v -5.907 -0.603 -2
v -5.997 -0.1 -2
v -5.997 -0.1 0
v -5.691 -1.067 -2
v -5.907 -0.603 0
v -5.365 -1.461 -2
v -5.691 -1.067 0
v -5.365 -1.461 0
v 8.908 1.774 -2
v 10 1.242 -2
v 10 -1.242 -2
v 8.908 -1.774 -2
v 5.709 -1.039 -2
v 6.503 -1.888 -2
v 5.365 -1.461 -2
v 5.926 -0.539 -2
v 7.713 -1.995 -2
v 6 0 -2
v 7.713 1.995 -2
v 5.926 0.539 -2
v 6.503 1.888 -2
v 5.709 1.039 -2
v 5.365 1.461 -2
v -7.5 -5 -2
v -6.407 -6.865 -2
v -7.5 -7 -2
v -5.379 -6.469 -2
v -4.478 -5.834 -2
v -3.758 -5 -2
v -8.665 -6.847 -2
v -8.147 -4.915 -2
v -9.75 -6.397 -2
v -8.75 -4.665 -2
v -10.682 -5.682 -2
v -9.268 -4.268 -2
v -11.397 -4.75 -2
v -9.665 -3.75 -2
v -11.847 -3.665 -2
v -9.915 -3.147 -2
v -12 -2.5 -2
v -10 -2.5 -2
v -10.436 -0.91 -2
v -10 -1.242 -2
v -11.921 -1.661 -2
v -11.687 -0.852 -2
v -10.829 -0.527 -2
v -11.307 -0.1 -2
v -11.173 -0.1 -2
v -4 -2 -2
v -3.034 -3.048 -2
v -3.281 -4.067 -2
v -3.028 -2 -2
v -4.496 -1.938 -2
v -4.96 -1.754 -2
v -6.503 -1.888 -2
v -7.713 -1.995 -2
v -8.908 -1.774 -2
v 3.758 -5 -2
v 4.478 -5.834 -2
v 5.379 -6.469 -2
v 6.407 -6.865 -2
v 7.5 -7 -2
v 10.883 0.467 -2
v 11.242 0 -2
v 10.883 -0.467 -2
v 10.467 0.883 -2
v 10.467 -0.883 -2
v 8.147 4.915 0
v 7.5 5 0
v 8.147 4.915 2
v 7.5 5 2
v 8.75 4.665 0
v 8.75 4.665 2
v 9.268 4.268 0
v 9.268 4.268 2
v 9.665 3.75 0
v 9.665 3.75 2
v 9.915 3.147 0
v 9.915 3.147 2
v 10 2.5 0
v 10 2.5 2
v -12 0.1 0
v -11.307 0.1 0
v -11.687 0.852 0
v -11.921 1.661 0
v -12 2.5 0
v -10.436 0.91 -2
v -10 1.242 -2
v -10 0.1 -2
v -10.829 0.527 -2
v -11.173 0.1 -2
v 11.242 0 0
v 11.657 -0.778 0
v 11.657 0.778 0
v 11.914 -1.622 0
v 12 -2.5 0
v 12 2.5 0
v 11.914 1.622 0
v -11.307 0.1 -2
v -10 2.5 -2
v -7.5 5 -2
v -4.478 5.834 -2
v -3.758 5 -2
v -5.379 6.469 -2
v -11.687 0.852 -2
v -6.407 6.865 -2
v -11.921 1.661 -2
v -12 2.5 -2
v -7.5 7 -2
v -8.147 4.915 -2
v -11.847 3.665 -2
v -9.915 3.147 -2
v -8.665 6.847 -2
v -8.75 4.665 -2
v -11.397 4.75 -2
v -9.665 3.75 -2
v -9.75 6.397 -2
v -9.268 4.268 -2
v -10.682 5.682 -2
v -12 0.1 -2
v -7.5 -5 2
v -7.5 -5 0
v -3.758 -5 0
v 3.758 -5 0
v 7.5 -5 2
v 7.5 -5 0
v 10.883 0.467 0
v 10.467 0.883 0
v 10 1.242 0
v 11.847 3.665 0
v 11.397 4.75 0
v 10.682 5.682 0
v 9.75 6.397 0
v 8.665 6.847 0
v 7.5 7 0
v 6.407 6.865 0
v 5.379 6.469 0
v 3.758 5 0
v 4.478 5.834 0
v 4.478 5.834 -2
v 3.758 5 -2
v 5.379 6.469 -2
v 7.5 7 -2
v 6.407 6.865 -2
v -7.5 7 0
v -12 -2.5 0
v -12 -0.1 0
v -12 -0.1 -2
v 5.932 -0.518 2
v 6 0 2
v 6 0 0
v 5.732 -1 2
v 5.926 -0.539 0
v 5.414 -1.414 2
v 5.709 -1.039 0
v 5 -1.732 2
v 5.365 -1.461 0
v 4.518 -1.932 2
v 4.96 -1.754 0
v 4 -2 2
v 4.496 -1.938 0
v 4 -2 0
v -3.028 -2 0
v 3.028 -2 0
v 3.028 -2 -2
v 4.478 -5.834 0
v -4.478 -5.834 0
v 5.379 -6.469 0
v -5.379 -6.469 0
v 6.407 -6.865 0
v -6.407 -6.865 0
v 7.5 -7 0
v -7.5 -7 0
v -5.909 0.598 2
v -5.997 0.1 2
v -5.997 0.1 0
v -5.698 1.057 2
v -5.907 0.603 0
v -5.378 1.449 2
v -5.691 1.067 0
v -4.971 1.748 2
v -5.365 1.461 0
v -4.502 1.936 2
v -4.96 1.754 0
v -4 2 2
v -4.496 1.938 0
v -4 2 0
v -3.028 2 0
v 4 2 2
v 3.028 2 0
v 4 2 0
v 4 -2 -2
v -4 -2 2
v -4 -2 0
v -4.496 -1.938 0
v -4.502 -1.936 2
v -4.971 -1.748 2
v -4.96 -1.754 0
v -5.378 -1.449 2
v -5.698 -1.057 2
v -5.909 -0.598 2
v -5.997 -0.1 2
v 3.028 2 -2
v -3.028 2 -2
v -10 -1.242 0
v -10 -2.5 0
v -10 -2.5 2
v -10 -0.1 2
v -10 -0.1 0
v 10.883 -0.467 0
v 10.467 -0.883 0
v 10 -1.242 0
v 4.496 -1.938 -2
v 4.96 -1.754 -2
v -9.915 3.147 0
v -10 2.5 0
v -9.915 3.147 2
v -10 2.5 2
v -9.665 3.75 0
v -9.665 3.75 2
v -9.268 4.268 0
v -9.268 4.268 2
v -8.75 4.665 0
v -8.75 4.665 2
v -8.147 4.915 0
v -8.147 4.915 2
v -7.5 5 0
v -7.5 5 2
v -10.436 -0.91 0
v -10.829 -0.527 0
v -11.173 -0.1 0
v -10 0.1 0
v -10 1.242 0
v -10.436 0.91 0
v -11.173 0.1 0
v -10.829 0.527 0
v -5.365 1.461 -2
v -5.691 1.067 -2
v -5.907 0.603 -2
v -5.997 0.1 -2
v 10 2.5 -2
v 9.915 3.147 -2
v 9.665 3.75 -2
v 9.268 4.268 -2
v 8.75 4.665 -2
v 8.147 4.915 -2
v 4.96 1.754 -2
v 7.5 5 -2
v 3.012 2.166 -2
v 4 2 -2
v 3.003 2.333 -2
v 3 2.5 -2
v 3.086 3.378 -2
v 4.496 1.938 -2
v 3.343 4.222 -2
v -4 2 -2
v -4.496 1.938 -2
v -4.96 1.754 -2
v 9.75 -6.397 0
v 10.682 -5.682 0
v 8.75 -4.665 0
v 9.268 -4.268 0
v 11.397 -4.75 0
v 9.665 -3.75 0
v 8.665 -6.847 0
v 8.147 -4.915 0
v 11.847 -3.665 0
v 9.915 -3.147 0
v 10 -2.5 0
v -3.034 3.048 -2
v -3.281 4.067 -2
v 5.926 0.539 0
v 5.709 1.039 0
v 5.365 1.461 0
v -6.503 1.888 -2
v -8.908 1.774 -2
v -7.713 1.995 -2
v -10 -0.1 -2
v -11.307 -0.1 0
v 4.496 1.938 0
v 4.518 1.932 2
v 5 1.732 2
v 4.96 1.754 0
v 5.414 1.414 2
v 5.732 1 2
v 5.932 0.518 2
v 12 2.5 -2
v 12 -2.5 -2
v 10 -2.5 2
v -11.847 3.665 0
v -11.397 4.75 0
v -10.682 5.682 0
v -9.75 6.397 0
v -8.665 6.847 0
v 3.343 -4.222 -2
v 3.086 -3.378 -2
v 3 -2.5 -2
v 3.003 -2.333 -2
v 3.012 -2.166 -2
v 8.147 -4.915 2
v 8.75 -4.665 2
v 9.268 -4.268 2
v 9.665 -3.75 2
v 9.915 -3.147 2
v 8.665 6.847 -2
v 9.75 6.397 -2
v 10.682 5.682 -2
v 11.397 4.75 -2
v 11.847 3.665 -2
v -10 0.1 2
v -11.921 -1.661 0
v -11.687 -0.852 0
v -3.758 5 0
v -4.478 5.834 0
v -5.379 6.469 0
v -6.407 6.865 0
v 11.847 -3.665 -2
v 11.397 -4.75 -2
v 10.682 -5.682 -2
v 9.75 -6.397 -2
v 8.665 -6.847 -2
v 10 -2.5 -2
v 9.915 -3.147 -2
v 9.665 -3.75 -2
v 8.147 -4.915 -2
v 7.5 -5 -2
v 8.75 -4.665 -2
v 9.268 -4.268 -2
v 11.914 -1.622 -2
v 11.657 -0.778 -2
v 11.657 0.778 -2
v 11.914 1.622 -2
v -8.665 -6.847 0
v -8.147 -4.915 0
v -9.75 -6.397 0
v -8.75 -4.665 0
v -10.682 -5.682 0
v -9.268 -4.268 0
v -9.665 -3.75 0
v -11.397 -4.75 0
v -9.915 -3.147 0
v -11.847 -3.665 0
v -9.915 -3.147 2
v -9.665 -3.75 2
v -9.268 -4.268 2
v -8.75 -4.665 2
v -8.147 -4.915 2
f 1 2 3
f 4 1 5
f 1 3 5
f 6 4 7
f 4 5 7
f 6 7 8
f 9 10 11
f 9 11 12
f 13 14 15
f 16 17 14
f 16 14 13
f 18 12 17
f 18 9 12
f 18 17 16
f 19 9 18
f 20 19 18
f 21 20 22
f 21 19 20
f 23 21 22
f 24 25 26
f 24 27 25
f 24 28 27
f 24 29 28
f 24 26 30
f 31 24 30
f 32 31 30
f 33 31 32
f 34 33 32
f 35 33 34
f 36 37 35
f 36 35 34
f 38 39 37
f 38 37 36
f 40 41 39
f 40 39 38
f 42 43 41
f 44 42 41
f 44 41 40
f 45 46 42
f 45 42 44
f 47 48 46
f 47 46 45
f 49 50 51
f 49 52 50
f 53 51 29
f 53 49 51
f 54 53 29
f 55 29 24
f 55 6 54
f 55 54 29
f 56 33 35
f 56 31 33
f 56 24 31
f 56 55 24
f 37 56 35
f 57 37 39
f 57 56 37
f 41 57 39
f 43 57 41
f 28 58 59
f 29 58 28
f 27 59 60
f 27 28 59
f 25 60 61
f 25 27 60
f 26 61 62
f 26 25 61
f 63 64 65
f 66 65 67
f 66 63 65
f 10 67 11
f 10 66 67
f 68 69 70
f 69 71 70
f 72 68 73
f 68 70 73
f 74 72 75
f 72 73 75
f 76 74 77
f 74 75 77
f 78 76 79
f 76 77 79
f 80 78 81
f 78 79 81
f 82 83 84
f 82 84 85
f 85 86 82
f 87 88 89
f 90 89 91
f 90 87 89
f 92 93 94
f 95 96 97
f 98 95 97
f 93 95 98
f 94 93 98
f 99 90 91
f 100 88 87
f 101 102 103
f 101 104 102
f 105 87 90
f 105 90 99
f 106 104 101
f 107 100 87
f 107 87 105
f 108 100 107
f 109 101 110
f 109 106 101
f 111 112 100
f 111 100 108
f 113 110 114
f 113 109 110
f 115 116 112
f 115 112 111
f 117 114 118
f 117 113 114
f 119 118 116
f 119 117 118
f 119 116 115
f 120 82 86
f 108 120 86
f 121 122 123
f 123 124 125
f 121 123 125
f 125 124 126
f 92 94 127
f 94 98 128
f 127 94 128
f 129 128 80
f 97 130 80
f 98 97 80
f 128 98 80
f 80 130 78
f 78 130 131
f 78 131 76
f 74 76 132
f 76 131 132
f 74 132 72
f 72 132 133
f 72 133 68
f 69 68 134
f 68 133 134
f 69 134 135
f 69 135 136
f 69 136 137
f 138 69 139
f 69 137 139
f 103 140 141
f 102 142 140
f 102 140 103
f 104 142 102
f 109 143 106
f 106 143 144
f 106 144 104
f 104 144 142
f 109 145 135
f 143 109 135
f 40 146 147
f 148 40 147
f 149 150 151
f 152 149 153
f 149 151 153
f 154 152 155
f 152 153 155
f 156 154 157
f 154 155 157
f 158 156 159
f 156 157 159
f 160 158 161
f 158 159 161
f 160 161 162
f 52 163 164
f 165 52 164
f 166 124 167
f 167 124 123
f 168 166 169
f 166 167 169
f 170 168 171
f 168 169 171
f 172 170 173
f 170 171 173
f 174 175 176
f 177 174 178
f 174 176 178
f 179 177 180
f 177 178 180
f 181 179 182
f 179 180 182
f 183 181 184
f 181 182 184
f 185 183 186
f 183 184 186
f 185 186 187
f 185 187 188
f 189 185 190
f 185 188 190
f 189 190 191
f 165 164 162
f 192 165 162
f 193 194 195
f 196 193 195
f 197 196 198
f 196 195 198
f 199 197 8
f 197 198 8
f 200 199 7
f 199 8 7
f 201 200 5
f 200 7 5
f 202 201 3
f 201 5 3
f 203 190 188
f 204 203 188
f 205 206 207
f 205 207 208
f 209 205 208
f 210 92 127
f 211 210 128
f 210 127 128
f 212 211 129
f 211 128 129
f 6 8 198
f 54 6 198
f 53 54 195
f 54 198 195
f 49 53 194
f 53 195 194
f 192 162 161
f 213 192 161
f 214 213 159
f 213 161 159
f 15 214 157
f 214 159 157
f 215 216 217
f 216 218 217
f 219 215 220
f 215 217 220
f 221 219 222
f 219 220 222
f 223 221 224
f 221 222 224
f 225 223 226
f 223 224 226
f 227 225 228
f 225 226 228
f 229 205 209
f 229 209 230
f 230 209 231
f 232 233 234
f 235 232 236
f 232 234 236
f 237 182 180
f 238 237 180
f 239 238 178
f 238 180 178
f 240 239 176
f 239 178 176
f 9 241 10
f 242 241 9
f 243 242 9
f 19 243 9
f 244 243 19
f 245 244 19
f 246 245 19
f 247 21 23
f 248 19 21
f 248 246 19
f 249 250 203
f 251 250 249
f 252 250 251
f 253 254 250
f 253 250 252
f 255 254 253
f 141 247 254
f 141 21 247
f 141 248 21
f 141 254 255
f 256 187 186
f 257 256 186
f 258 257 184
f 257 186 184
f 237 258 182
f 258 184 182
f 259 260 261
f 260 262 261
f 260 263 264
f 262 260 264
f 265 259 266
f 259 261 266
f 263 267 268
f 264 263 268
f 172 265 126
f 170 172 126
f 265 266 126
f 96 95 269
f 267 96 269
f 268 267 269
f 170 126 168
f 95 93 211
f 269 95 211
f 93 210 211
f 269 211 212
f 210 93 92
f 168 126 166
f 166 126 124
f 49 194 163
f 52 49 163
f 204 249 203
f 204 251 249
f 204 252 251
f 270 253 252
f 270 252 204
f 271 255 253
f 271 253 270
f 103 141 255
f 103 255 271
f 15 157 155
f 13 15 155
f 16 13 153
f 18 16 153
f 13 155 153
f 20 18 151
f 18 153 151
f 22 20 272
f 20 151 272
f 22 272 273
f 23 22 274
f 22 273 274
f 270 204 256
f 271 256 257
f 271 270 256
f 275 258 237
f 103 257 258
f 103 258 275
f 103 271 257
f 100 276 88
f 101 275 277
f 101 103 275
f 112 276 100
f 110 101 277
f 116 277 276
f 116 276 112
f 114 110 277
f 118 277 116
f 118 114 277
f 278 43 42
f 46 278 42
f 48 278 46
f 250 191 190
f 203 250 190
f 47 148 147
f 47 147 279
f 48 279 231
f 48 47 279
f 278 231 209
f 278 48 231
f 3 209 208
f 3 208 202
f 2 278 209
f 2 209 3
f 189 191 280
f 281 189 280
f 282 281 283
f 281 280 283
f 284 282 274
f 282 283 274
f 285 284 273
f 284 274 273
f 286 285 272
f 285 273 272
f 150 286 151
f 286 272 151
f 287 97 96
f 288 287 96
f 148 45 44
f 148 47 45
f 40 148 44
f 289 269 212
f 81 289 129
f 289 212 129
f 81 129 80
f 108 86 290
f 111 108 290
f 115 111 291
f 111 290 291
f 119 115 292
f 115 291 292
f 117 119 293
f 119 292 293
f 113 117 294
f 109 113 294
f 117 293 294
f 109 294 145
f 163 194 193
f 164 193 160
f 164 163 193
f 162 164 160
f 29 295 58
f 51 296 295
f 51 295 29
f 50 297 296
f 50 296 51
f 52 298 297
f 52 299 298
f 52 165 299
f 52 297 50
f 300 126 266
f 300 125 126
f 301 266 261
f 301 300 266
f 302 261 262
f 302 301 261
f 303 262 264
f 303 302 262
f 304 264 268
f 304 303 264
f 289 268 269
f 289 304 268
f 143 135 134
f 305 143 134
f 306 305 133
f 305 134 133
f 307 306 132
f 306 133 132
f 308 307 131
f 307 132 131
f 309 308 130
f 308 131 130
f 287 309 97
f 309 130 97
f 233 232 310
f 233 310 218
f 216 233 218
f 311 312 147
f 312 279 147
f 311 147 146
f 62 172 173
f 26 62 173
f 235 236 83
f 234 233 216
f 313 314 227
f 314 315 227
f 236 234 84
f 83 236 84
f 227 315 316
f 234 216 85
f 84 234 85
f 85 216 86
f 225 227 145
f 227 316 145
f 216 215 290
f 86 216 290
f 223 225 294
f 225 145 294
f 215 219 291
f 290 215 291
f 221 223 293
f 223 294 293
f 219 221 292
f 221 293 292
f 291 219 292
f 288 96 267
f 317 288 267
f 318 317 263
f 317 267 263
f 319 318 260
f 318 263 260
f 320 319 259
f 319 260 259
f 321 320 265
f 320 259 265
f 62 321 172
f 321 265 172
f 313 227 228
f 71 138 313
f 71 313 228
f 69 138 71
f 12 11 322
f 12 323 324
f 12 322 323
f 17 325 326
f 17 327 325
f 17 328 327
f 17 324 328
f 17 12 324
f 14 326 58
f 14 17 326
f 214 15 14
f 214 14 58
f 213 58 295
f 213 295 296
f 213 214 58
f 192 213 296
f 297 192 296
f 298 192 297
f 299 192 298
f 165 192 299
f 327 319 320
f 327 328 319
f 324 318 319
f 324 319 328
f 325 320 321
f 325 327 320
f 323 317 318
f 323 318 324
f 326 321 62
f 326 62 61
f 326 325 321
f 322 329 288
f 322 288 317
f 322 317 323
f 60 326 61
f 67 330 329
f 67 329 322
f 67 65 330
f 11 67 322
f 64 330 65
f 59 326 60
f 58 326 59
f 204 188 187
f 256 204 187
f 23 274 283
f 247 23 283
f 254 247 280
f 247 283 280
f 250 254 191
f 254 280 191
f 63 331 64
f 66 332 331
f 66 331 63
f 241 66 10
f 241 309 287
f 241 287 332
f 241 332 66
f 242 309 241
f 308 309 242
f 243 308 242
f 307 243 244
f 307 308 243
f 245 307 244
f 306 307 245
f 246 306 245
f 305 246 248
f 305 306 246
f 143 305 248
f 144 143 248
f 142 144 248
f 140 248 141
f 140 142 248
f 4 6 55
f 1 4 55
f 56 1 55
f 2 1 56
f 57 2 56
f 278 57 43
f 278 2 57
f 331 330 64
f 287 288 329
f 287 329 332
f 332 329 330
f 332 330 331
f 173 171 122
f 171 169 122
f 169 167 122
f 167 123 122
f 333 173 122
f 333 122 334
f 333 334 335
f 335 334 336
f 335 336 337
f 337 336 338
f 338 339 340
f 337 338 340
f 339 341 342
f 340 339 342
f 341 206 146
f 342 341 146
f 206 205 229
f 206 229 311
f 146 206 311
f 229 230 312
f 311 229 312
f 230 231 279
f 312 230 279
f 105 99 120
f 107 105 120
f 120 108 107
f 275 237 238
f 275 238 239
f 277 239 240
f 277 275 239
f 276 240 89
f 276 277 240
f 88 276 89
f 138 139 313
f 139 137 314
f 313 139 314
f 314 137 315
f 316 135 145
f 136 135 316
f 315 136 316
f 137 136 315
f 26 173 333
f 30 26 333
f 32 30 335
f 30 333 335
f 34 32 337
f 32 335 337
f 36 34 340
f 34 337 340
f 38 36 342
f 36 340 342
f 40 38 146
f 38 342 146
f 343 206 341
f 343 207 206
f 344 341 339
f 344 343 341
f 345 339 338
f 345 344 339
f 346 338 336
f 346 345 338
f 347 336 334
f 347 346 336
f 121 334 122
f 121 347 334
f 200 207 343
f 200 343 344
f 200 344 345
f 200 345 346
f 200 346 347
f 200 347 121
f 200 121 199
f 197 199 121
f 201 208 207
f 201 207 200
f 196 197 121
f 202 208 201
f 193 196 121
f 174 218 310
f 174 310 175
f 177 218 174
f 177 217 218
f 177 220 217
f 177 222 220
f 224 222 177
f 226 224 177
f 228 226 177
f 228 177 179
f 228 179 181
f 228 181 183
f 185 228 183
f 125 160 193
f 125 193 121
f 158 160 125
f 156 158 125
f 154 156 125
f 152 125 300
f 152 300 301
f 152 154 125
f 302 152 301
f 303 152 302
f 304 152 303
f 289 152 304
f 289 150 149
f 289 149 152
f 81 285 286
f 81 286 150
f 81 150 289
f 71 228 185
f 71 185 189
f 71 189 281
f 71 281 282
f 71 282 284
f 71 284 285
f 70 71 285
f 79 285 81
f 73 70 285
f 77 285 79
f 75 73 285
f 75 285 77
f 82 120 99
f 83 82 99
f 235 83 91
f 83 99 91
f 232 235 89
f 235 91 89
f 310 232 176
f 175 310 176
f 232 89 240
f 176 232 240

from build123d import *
from build123d.topology import SkipClean

# Parameters (mm, degrees)
SKETCH1_W               = 20
SKETCH1_H               = 10
SKETCH1_W_2             = 12
SKETCH1_H_2             = 4
BOSS_EXTRUDE1_DEPTH     = 2
FILLET1_R               = 2.5
BOSS_EXTRUDE2_DEPTH     = 2
CUT_EXTRUDE1_DEPTH      = 15.035668848
CUT_EXTRUDE1_DEPTH_BACK = 15.035668848
SKETCH3_W               = 8
SKETCH3_H               = 0.2


with BuildPart() as part:
    # Sketch1 → Boss-Extrude1 (new body)
    # profile 1 of 5: a face of its own
    with BuildSketch(Plane.XY):
        Rectangle(SKETCH1_W, SKETCH1_H)
        Rectangle(SKETCH1_W_2, SKETCH1_H_2, mode=Mode.SUBTRACT)
    # profile 2 of 5: a face of its own
    with BuildSketch(Plane.XY):
        with BuildLine():
            ThreePointArc((-6, 0), (-5.414213562, 1.414213562), (-4, 2))
            Line((-4, 2), (-6, 2))
            Line((-6, 2), (-6, 0))
        make_face()
    # profile 3 of 5: a face of its own
    with BuildSketch(Plane.XY):
        with BuildLine():
            ThreePointArc((-4, -2), (-5.414213562, -1.414213562), (-6, 0))
            Line((-6, 0), (-6, -2))
            Line((-6, -2), (-4, -2))
        make_face()
    # profile 4 of 5: a face of its own
    with BuildSketch(Plane.XY):
        with BuildLine():
            Line((6, -2), (6, 0))
            ThreePointArc((6, 0), (5.414213562, -1.414213562), (4, -2))
            Line((4, -2), (6, -2))
        make_face()
    # profile 5 of 5: a face of its own
    with BuildSketch(Plane.XY):
        with BuildLine():
            Line((6, 0), (6, 2))
            Line((6, 2), (4, 2))
            ThreePointArc((4, 2), (5.414213562, 1.414213562), (6, 0))
        make_face()
    extrude(amount=BOSS_EXTRUDE1_DEPTH)

    # Fillet1
    fillet1_edges = [part.edges().sort_by_distance(p)[0] for p in [
        (10, -5, 1),
        (-10, -5, 1),
        (-10, 5, 1),
        (10, 5, 1),
    ]]
    fillet(fillet1_edges, radius=FILLET1_R)

    # Sketch2 → Boss-Extrude2 (add)
    with SkipClean():  # the faces are left unmerged after this step: merging them gives an invalid solid
        with BuildSketch(Plane(origin=(0, 0, 0), x_dir=(-1, 0, 0), z_dir=(0, 0, -1))):
            with BuildLine():
                Line((-3.758342613, 5), (3.758342613, 5))
                ThreePointArc((3.758342613, 5), (5.378679665, 6.468626971), (7.500000019, 7))
                Line((7.500000019, 7), (-7.5, 7))
                ThreePointArc((-7.5, 7), (-5.378679656, 6.468626967), (-3.758342613, 5))
            make_face()
            with BuildLine():
                ThreePointArc((-11.241657387, 0), (-10.681980515, 0.681980515), (-10, 1.241657387))
                Line((-10, 1.241657387), (-10, 2.5))
                ThreePointArc((-10, 2.5), (-9.267766953, 4.267766953), (-7.5, 5))
                Line((-7.5, 5), (-3.758342613, 5))
                ThreePointArc((-3.758342613, 5), (-5.378679656, 6.468626967), (-7.5, 7))
                ThreePointArc((-7.5, 7), (-10.681980515, 5.681980515), (-12, 2.5))
                ThreePointArc((-12, 2.5), (-11.80624304, 1.19375696), (-11.241657387, 0))
            make_face()
            with BuildLine():
                Line((-10, -1.241657387), (-10, 1.241657387))
                ThreePointArc((-10, 1.241657387), (-10.681980515, 0.681980515), (-11.241657387, 0))
                ThreePointArc((-11.241657387, 0), (-10.681980515, -0.681980515), (-10, -1.241657387))
            make_face()
            with BuildLine():
                ThreePointArc((-12, -2.5), (-11.80624304, -1.19375696), (-11.241657387, 0))
                ThreePointArc((-11.241657387, 0), (-11.80624304, 1.19375696), (-12, 2.5))
                Line((-12, 2.5), (-12, -2.5))
            make_face()
            with BuildLine():
                Line((-10, -2.5), (-10, -1.241657387))
                ThreePointArc((-10, -1.241657387), (-10.681980515, -0.681980515), (-11.241657387, 0))
                ThreePointArc((-11.241657387, 0), (-11.80624304, -1.19375696), (-12, -2.5))
                ThreePointArc((-12, -2.5), (-10.681980515, -5.681980515), (-7.5, -7))
                ThreePointArc((-7.5, -7), (-5.378679656, -6.468626967), (-3.758342613, -5))
                Line((-3.758342613, -5), (-7.5, -5))
                ThreePointArc((-7.5, -5), (-9.267766953, -4.267766953), (-10, -2.5))
            make_face()
            with BuildLine():
                ThreePointArc((7.499999979, -7), (5.378679647, -6.468626962), (3.758342613, -5))
                Line((3.758342613, -5), (-3.758342613, -5))
                ThreePointArc((-3.758342613, -5), (-5.378679656, -6.468626967), (-7.5, -7))
                Line((-7.5, -7), (7.499999979, -7))
            make_face()
            with BuildLine():
                Line((7.5, -5), (3.758342613, -5))
                ThreePointArc((3.758342613, -5), (5.378679647, -6.468626962), (7.499999979, -7))
                ThreePointArc((7.499999979, -7), (10.681980508, -5.681980523), (12, -2.5))
                ThreePointArc((12, -2.5), (11.80624304, -1.19375696), (11.241657387, 0))
                ThreePointArc((11.241657387, 0), (10.681980515, -0.681980515), (10, -1.241657387))
                Line((10, -1.241657387), (10, -2.5))
                ThreePointArc((10, -2.5), (9.267766953, -4.267766953), (7.5, -5))
            make_face()
            with BuildLine():
                ThreePointArc((11.241657387, 0), (10.681980515, 0.681980515), (10, 1.241657387))
                Line((10, 1.241657387), (10, -1.241657387))
                ThreePointArc((10, -1.241657387), (10.681980515, -0.681980515), (11.241657387, 0))
            make_face()
            with BuildLine():
                Line((12, -2.5), (12, 2.5))
                ThreePointArc((12, 2.5), (11.80624304, 1.19375696), (11.241657387, 0))
                ThreePointArc((11.241657387, 0), (11.80624304, -1.19375696), (12, -2.5))
            make_face()
            with BuildLine():
                ThreePointArc((7.500000019, 7), (5.378679665, 6.468626971), (3.758342613, 5))
                Line((3.758342613, 5), (7.5, 5))
                ThreePointArc((7.5, 5), (9.267766953, 4.267766953), (10, 2.5))
                Line((10, 2.5), (10, 1.241657387))
                ThreePointArc((10, 1.241657387), (10.681980515, 0.681980515), (11.241657387, 0))
                ThreePointArc((11.241657387, 0), (11.80624304, 1.19375696), (12, 2.5))
                ThreePointArc((12, 2.5), (10.681980522, 5.681980509), (7.500000019, 7))
            make_face()
            with BuildLine():
                ThreePointArc((-5.365330412, 1.461462577), (-4.73385109, 1.860500625), (-4, 2))
                Line((-4, 2), (-3.027864045, 2))
                ThreePointArc((-3.027864045, 2), (-3.006971411, 2.249612098), (-3, 2.5))
                ThreePointArc((-3, 2.5), (-3.19375696, 3.80624304), (-3.758342613, 5))
                Line((-3.758342613, 5), (-7.5, 5))
                ThreePointArc((-7.5, 5), (-9.267766953, 4.267766953), (-10, 2.5))
                Line((-10, 2.5), (-10, 1.241657387))
                ThreePointArc((-10, 1.241657387), (-7.7131787, 1.994947702), (-5.365330412, 1.461462577))
            make_face()
            with BuildLine():
                ThreePointArc((-5.365330412, -1.461462577), (-6, 0), (-5.365330412, 1.461462577))
                ThreePointArc((-5.365330412, 1.461462577), (-7.7131787, 1.994947702), (-10, 1.241657387))
                Line((-10, 1.241657387), (-10, -1.241657387))
                ThreePointArc((-10, -1.241657387), (-7.7131787, -1.994947702), (-5.365330412, -1.461462577))
            make_face()
            with BuildLine():
                ThreePointArc((-4, -2), (-4.73385109, -1.860500625), (-5.365330412, -1.461462577))
                ThreePointArc((-5.365330412, -1.461462577), (-7.7131787, -1.994947702), (-10, -1.241657387))
                Line((-10, -1.241657387), (-10, -2.5))
                ThreePointArc((-10, -2.5), (-9.267766953, -4.267766953), (-7.5, -5))
                Line((-7.5, -5), (-3.758342613, -5))
                ThreePointArc((-3.758342613, -5), (-3.19375696, -3.80624304), (-3, -2.5))
                ThreePointArc((-3, -2.5), (-3.006971411, -2.249612098), (-3.027864045, -2))
                Line((-3.027864045, -2), (-4, -2))
            make_face()
            with BuildLine():
                Line((3.027864045, -2), (-3.027864045, -2))
                ThreePointArc((-3.027864045, -2), (-3.006971411, -2.249612098), (-3, -2.5))
                ThreePointArc((-3, -2.5), (-3.19375696, -3.80624304), (-3.758342613, -5))
                Line((-3.758342613, -5), (3.758342613, -5))
                ThreePointArc((3.758342613, -5), (3.127746546, -3.564612481), (3.027864045, -2))
            make_face()
            with BuildLine():
                Line((4, -2), (3.027864045, -2))
                ThreePointArc((3.027864045, -2), (3.127746546, -3.564612481), (3.758342613, -5))
                Line((3.758342613, -5), (7.5, -5))
                ThreePointArc((7.5, -5), (9.267766953, -4.267766953), (10, -2.5))
                Line((10, -2.5), (10, -1.241657387))
                ThreePointArc((10, -1.241657387), (7.7131787, -1.994947702), (5.365330412, -1.461462577))
                ThreePointArc((5.365330412, -1.461462577), (4.73385109, -1.860500625), (4, -2))
            make_face()
            with BuildLine():
                ThreePointArc((10, 1.241657387), (7.7131787, 1.994947702), (5.365330412, 1.461462577))
                ThreePointArc((5.365330412, 1.461462577), (6, 0), (5.365330412, -1.461462577))
                ThreePointArc((5.365330412, -1.461462577), (7.7131787, -1.994947702), (10, -1.241657387))
                Line((10, -1.241657387), (10, 1.241657387))
            make_face()
            with BuildLine():
                ThreePointArc((3.758342613, 5), (3.127746546, 3.564612481), (3.027864045, 2))
                Line((3.027864045, 2), (4, 2))
                ThreePointArc((4, 2), (4.73385109, 1.860500625), (5.365330412, 1.461462577))
                ThreePointArc((5.365330412, 1.461462577), (7.7131787, 1.994947702), (10, 1.241657387))
                Line((10, 1.241657387), (10, 2.5))
                ThreePointArc((10, 2.5), (9.267766953, 4.267766953), (7.5, 5))
                Line((7.5, 5), (3.758342613, 5))
            make_face()
            with BuildLine():
                ThreePointArc((-3, 2.5), (-3.006971411, 2.249612098), (-3.027864045, 2))
                Line((-3.027864045, 2), (3.027864045, 2))
                ThreePointArc((3.027864045, 2), (3.127746546, 3.564612481), (3.758342613, 5))
                Line((3.758342613, 5), (-3.758342613, 5))
                ThreePointArc((-3.758342613, 5), (-3.19375696, 3.80624304), (-3, 2.5))
            make_face()
        extrude(amount=BOSS_EXTRUDE2_DEPTH)

    # Sketch3 → Cut-Extrude1 (cut, two sides: drawn at the far end of the back side and taken through both)
    with SkipClean():  # the faces are left unmerged after this step: merging them gives an invalid solid
        with BuildSketch(Plane.XY.offset(-CUT_EXTRUDE1_DEPTH_BACK)):
            with Locations((-8, 0)):
                Rectangle(SKETCH3_W, SKETCH3_H)
        extrude(amount=CUT_EXTRUDE1_DEPTH + CUT_EXTRUDE1_DEPTH_BACK, mode=Mode.SUBTRACT)


solid = part.part
